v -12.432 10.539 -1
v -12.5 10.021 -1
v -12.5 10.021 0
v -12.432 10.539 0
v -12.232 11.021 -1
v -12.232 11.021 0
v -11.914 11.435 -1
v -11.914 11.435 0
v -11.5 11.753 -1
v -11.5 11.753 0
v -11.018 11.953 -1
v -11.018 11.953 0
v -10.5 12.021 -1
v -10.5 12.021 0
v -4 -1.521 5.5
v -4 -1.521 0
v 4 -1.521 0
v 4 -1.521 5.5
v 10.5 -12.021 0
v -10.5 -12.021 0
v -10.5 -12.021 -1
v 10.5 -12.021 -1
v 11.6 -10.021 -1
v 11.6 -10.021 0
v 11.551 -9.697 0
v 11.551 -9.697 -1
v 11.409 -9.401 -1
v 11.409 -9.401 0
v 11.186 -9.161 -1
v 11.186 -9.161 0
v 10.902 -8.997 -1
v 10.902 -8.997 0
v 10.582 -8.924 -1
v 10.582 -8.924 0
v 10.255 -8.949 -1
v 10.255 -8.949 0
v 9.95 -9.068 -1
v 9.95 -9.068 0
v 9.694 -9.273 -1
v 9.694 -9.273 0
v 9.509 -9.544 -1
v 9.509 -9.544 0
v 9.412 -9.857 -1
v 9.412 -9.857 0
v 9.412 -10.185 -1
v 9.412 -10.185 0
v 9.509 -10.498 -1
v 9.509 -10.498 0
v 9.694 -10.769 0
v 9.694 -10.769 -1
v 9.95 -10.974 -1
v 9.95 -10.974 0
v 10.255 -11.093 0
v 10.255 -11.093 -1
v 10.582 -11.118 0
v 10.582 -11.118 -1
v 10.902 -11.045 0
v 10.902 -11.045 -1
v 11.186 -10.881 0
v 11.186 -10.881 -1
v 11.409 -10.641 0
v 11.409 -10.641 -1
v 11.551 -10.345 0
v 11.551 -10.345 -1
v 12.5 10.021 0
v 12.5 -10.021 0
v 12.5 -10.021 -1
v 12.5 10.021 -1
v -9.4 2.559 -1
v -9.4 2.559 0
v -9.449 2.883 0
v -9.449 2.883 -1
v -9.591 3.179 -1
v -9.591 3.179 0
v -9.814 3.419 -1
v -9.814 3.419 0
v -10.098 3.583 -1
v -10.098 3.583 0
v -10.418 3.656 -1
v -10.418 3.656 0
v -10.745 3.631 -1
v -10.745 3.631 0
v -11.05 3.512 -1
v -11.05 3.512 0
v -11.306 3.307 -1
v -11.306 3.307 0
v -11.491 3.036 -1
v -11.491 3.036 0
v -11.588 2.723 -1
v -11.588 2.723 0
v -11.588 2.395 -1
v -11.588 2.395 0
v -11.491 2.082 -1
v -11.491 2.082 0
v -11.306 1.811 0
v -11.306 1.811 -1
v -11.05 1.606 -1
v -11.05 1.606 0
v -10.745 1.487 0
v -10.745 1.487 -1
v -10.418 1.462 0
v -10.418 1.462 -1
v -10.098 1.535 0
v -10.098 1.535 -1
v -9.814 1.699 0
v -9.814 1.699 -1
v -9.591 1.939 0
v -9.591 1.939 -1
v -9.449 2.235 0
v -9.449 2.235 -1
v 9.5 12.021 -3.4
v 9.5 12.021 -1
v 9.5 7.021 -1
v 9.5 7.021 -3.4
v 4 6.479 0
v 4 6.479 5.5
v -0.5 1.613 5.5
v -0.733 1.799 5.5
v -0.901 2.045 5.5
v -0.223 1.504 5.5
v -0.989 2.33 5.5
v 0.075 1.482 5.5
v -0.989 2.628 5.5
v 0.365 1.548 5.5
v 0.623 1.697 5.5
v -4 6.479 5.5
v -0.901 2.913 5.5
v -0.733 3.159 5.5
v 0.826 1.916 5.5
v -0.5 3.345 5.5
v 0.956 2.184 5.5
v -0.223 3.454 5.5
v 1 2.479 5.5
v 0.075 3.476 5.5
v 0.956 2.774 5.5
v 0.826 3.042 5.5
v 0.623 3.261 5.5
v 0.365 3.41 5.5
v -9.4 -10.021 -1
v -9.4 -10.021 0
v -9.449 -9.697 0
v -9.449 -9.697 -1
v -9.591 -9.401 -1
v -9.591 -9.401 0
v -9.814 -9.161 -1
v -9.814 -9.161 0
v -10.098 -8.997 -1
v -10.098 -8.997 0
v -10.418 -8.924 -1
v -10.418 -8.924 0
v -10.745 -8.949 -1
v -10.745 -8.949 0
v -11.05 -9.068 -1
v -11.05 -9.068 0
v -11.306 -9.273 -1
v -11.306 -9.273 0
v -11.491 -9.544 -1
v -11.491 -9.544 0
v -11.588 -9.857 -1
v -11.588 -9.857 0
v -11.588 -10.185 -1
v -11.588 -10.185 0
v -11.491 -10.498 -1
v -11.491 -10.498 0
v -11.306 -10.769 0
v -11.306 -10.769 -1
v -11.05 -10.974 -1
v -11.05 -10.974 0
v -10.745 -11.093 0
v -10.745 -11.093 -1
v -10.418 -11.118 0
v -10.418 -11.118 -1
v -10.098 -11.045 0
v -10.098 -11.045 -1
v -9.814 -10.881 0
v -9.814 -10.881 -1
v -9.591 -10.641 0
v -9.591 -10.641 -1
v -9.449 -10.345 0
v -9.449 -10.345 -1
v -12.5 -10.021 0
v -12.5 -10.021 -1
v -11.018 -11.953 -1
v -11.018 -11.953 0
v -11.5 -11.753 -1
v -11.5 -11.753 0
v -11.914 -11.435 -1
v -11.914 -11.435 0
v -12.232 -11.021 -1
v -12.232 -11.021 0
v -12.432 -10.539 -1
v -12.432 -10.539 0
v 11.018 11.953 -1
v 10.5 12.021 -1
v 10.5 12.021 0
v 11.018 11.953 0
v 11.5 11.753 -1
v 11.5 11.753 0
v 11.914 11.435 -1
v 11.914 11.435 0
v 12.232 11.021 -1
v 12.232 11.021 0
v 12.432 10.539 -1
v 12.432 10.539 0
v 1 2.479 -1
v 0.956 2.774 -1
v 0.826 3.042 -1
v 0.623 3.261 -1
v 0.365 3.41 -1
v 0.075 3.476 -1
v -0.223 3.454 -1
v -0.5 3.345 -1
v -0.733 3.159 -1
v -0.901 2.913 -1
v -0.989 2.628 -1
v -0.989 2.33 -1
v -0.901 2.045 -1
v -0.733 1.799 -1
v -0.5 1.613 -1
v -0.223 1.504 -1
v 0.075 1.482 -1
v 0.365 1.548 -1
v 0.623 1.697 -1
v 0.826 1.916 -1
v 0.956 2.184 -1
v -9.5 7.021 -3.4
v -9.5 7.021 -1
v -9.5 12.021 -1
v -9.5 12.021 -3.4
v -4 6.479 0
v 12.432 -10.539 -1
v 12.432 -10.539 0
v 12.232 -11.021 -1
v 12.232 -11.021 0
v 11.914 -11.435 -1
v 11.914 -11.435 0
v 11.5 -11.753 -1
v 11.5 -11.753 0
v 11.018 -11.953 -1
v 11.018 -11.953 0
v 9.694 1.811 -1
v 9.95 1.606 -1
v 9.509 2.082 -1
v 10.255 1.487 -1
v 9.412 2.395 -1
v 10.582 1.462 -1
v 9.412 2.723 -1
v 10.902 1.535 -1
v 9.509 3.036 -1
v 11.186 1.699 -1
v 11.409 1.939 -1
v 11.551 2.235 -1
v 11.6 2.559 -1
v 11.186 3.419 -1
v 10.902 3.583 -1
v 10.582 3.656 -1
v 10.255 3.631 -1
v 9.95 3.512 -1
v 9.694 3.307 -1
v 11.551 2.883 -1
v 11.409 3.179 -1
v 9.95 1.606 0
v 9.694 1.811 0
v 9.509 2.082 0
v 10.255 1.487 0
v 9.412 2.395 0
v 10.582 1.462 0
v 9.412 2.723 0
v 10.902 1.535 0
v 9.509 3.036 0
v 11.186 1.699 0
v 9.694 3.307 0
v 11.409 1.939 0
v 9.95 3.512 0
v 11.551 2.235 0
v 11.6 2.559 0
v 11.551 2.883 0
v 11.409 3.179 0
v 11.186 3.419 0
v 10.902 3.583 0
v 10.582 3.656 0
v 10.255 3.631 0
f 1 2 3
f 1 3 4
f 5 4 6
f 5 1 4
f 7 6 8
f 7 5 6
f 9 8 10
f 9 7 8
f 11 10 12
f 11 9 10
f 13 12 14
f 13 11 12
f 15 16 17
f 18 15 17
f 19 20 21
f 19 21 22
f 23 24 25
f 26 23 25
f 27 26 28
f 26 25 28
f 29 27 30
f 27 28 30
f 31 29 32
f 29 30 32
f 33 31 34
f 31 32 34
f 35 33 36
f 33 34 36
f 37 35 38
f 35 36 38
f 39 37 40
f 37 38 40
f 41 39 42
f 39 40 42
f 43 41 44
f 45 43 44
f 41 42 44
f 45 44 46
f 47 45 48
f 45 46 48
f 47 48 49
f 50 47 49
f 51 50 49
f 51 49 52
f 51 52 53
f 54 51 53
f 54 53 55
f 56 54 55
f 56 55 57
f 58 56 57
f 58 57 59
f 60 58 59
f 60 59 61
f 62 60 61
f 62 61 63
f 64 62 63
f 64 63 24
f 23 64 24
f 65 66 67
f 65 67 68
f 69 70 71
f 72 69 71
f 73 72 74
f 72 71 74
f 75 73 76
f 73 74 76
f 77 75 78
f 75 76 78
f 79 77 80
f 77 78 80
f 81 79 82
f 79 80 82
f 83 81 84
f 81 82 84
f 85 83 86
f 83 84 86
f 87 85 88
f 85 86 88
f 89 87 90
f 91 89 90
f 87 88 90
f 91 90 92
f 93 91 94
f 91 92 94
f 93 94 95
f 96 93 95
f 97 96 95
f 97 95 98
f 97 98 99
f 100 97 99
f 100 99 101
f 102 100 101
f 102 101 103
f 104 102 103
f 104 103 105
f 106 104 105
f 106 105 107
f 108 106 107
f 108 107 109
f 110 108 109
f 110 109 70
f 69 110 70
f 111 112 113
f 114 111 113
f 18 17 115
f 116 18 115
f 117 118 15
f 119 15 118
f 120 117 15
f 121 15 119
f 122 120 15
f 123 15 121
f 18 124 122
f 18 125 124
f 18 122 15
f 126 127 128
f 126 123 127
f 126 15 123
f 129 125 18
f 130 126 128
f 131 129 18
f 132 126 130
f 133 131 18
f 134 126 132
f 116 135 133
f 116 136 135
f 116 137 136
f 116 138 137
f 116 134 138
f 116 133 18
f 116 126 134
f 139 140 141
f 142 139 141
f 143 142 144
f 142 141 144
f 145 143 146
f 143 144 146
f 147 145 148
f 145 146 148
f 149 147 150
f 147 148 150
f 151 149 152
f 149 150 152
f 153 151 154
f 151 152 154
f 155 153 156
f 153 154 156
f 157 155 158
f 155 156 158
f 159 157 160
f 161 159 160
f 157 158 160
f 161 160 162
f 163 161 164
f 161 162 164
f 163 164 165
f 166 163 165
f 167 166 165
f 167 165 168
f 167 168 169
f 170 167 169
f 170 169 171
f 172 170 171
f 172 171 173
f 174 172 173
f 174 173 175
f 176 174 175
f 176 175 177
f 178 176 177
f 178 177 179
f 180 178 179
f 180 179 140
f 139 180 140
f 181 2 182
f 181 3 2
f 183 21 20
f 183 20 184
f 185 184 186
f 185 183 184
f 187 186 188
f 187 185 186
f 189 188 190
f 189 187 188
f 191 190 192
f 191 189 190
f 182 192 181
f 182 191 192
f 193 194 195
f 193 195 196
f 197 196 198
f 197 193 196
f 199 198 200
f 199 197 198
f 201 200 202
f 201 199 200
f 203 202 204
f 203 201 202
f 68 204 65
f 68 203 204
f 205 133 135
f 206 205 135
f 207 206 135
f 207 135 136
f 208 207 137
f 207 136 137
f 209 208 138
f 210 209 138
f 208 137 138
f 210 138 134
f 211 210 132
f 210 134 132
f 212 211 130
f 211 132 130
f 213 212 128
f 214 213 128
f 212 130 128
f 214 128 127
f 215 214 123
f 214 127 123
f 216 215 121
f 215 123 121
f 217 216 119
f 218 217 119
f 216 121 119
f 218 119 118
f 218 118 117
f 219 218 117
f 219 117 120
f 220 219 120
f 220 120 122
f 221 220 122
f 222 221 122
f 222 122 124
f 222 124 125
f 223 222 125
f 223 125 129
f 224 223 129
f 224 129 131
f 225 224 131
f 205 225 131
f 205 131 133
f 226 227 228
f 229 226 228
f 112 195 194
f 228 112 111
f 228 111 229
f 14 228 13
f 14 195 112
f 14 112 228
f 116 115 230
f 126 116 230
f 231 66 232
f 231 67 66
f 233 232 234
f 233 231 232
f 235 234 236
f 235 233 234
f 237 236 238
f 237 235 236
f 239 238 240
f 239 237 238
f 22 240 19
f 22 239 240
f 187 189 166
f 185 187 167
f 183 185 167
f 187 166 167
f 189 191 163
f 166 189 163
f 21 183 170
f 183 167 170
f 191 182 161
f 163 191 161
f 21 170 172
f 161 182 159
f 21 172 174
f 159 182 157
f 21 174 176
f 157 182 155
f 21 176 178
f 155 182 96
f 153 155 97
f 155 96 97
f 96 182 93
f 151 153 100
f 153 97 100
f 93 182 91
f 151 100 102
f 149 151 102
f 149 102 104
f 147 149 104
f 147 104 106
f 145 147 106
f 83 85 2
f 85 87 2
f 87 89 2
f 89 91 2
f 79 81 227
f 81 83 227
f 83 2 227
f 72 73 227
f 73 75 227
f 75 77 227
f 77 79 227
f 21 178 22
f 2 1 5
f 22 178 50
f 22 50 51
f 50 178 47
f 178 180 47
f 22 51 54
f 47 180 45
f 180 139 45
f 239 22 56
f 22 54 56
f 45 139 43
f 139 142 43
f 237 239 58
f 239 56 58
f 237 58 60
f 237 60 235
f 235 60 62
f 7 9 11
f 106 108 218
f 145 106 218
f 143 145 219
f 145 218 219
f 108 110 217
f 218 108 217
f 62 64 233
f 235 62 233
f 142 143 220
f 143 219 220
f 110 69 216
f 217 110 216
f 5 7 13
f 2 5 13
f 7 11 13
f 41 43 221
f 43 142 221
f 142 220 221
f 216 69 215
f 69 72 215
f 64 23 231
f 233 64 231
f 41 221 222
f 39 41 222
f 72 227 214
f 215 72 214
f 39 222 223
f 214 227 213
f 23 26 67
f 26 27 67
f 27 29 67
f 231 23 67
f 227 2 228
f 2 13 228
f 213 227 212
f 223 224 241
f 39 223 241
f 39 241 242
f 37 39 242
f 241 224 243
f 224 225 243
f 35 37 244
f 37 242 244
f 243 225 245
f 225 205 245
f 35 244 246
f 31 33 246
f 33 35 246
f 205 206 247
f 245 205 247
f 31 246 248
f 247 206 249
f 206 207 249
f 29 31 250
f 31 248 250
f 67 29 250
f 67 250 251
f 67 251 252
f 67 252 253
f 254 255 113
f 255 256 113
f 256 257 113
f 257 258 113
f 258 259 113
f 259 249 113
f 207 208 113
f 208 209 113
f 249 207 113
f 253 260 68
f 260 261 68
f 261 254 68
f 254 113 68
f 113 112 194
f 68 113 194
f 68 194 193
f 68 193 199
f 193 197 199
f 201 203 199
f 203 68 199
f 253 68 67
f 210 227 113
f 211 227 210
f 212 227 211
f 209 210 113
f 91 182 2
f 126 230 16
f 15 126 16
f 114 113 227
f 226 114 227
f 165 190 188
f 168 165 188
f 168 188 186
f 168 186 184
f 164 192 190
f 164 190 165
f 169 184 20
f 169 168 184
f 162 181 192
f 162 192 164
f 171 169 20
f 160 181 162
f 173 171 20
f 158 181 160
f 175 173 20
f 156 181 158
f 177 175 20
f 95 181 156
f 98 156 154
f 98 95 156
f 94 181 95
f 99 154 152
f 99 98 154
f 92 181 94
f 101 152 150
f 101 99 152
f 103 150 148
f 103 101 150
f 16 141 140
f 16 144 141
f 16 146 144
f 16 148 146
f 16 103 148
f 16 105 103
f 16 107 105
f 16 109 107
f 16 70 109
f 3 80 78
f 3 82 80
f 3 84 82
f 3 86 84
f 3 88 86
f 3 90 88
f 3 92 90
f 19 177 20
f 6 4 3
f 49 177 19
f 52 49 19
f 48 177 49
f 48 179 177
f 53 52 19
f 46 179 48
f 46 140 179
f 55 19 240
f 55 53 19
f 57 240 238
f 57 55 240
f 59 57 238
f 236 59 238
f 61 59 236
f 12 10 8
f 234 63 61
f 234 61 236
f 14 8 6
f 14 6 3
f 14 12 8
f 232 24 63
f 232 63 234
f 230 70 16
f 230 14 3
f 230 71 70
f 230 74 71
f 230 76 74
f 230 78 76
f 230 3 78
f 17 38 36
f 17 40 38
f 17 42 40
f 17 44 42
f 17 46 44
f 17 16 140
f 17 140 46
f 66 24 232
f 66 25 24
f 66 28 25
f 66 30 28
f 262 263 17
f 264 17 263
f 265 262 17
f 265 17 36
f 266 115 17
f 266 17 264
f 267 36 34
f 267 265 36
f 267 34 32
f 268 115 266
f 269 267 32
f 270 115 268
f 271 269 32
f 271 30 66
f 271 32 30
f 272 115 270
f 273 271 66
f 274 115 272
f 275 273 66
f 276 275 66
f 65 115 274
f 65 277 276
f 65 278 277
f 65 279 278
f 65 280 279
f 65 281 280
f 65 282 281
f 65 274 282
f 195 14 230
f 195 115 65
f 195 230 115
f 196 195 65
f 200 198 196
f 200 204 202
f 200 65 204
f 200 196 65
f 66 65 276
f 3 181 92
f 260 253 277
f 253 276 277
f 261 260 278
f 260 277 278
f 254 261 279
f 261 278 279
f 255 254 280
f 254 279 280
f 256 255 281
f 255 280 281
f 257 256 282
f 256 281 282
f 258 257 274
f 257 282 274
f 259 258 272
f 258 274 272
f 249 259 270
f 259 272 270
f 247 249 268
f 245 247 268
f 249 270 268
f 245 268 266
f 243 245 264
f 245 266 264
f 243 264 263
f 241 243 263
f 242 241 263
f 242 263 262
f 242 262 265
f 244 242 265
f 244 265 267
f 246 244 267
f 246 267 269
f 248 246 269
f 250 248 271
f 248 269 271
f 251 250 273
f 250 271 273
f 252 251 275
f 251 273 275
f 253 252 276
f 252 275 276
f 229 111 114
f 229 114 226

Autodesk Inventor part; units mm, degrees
ref_plane "YZ Plane" through (0, 0, 0) normal (1, 0, 0) x (0, 1, 0)
ref_plane "XZ Plane" through (0, 0, 0) normal (0, 1, 0) x (-1, 0, 0)
ref_plane "XY Plane" through (0, 0, 0) normal (0, 0, 1) x (1, 0, 0)
sketch "Sketch1" plane through (0, 0, 0) normal (0, 0, 1) x (1, 0, 0)
  line L0 (-12.5, -12.021) -> (12.5, -12.021)
  line L1 (12.5, -12.021) -> (12.5, 12.021)
  line L2 (12.5, 12.021) -> (-12.5, 12.021)
  line L3 (-12.5, 12.021) -> (-12.5, -12.021)
  line L4 (-12.5, -12.021) -> (12.5, 12.021) construction
  line L5 (12.5, -12.021) -> (-12.5, 12.021) construction
  line L6 (-10.5, -10.021) -> (10.5, -10.021) construction
  line L7 (10.5, -10.021) -> (10.5, 2.559) construction
  line L8 (10.5, 2.559) -> (-10.5, 2.559) construction
  line L9 (-10.5, 2.559) -> (-10.5, -10.021) construction
  circle A0 centre (-10.5, -10.021) radius 1.1
  circle A1 centre (-10.5, 2.559) radius 1.1
  circle A2 centre (10.5, 2.559) radius 1.1
  circle A3 centre (10.5, -10.021) radius 1.1
  point P0 (0, 0)
  dimension "d0" = 2
  dimension "d1" = 2
  dimension "d2" = 2
  dimension "d3" = 12.58
  dimension "d4" = 9.462
  dimension "d5" = 25
  dimension "d6" = 2.2
extrude "Extrusion1" add sketch "Sketch1" against normal blind 1
sketch "Sketch2" plane through (0, 0, 0) normal (0, 0, 1) x (1, 0, 0)
  line L0 (-4, -1.521) -> (4, -1.521)
  line L1 (4, -1.521) -> (4, 6.479)
  line L2 (4, 6.479) -> (-4, 6.479)
  line L3 (-4, 6.479) -> (-4, -1.521)
  line L4 (-4, -1.521) -> (4, 6.479) construction
  line L5 (4, -1.521) -> (-4, 6.479) construction
  line L6 (-12.5, -12.021) -> (12.5, -12.021) projected
  point P0 (0, 0)
  point P1 (0, 2.479)
  dimension "d9" = 14.5
  dimension "d10" = 8
extrude "Extrusion2" add sketch "Sketch2" along normal blind 5.5
sketch "Sketch5" plane through (0, 0, 5.5) normal (0, 0, 1) x (1, 0, 0)
  line L0 (-4, -1.521) -> (-4, 6.479) construction
  line L1 (-4, -1.521) -> (4, -1.521) construction
  line L2 (-4, 6.479) -> (4, -1.521) construction
  line L3 (4, 6.479) -> (-4, 6.479) construction
  line L4 (4, 6.479) -> (-4, -1.521) construction
  circle A0 centre (0, 2.479) radius 1
  line L5 (0, 6.479) -> (0, -1.521) construction
  point P0 (0, 0)
  dimension "d13" = 2
extrude "Extrusion3" cut sketch "Sketch5" against normal through all
fillet "Fillet1" radius 2 4 edges at (-12.5, 12.021, -0.5) (12.5, 12.021, -0.5) (12.5, -12.021, -0.5) (-12.5, -12.021, -0.5)
sketch "Sketch6" plane through (0, 0, -1) normal (0, 0, -1) x (-1, 0, 0)
  line L0 (10.5, 12.021) -> (-10.5, 12.021) construction
  line L1 (0, 12.021) -> (0, -12.021) construction
  line L2 (-10.5, -12.021) -> (10.5, -12.021) construction
  line L3 (-9.5, 7.021) -> (9.5, 7.021)
  line L4 (9.5, 7.021) -> (9.5, 12.021)
  line L5 (9.5, 12.021) -> (-9.5, 12.021)
  line L6 (-9.5, 12.021) -> (-9.5, 7.021)
  line L7 (-9.5, 7.021) -> (9.5, 12.021) construction
  line L8 (9.5, 7.021) -> (-9.5, 12.021) construction
  point P0 (0, 0)
  point P1 (0, 9.521)
  dimension "d17" = 5
  dimension "d18" = 19
extrude "Extrusion4" add sketch "Sketch6" along normal blind 2.4
properties part number "RaspberryPiCameraModel"
